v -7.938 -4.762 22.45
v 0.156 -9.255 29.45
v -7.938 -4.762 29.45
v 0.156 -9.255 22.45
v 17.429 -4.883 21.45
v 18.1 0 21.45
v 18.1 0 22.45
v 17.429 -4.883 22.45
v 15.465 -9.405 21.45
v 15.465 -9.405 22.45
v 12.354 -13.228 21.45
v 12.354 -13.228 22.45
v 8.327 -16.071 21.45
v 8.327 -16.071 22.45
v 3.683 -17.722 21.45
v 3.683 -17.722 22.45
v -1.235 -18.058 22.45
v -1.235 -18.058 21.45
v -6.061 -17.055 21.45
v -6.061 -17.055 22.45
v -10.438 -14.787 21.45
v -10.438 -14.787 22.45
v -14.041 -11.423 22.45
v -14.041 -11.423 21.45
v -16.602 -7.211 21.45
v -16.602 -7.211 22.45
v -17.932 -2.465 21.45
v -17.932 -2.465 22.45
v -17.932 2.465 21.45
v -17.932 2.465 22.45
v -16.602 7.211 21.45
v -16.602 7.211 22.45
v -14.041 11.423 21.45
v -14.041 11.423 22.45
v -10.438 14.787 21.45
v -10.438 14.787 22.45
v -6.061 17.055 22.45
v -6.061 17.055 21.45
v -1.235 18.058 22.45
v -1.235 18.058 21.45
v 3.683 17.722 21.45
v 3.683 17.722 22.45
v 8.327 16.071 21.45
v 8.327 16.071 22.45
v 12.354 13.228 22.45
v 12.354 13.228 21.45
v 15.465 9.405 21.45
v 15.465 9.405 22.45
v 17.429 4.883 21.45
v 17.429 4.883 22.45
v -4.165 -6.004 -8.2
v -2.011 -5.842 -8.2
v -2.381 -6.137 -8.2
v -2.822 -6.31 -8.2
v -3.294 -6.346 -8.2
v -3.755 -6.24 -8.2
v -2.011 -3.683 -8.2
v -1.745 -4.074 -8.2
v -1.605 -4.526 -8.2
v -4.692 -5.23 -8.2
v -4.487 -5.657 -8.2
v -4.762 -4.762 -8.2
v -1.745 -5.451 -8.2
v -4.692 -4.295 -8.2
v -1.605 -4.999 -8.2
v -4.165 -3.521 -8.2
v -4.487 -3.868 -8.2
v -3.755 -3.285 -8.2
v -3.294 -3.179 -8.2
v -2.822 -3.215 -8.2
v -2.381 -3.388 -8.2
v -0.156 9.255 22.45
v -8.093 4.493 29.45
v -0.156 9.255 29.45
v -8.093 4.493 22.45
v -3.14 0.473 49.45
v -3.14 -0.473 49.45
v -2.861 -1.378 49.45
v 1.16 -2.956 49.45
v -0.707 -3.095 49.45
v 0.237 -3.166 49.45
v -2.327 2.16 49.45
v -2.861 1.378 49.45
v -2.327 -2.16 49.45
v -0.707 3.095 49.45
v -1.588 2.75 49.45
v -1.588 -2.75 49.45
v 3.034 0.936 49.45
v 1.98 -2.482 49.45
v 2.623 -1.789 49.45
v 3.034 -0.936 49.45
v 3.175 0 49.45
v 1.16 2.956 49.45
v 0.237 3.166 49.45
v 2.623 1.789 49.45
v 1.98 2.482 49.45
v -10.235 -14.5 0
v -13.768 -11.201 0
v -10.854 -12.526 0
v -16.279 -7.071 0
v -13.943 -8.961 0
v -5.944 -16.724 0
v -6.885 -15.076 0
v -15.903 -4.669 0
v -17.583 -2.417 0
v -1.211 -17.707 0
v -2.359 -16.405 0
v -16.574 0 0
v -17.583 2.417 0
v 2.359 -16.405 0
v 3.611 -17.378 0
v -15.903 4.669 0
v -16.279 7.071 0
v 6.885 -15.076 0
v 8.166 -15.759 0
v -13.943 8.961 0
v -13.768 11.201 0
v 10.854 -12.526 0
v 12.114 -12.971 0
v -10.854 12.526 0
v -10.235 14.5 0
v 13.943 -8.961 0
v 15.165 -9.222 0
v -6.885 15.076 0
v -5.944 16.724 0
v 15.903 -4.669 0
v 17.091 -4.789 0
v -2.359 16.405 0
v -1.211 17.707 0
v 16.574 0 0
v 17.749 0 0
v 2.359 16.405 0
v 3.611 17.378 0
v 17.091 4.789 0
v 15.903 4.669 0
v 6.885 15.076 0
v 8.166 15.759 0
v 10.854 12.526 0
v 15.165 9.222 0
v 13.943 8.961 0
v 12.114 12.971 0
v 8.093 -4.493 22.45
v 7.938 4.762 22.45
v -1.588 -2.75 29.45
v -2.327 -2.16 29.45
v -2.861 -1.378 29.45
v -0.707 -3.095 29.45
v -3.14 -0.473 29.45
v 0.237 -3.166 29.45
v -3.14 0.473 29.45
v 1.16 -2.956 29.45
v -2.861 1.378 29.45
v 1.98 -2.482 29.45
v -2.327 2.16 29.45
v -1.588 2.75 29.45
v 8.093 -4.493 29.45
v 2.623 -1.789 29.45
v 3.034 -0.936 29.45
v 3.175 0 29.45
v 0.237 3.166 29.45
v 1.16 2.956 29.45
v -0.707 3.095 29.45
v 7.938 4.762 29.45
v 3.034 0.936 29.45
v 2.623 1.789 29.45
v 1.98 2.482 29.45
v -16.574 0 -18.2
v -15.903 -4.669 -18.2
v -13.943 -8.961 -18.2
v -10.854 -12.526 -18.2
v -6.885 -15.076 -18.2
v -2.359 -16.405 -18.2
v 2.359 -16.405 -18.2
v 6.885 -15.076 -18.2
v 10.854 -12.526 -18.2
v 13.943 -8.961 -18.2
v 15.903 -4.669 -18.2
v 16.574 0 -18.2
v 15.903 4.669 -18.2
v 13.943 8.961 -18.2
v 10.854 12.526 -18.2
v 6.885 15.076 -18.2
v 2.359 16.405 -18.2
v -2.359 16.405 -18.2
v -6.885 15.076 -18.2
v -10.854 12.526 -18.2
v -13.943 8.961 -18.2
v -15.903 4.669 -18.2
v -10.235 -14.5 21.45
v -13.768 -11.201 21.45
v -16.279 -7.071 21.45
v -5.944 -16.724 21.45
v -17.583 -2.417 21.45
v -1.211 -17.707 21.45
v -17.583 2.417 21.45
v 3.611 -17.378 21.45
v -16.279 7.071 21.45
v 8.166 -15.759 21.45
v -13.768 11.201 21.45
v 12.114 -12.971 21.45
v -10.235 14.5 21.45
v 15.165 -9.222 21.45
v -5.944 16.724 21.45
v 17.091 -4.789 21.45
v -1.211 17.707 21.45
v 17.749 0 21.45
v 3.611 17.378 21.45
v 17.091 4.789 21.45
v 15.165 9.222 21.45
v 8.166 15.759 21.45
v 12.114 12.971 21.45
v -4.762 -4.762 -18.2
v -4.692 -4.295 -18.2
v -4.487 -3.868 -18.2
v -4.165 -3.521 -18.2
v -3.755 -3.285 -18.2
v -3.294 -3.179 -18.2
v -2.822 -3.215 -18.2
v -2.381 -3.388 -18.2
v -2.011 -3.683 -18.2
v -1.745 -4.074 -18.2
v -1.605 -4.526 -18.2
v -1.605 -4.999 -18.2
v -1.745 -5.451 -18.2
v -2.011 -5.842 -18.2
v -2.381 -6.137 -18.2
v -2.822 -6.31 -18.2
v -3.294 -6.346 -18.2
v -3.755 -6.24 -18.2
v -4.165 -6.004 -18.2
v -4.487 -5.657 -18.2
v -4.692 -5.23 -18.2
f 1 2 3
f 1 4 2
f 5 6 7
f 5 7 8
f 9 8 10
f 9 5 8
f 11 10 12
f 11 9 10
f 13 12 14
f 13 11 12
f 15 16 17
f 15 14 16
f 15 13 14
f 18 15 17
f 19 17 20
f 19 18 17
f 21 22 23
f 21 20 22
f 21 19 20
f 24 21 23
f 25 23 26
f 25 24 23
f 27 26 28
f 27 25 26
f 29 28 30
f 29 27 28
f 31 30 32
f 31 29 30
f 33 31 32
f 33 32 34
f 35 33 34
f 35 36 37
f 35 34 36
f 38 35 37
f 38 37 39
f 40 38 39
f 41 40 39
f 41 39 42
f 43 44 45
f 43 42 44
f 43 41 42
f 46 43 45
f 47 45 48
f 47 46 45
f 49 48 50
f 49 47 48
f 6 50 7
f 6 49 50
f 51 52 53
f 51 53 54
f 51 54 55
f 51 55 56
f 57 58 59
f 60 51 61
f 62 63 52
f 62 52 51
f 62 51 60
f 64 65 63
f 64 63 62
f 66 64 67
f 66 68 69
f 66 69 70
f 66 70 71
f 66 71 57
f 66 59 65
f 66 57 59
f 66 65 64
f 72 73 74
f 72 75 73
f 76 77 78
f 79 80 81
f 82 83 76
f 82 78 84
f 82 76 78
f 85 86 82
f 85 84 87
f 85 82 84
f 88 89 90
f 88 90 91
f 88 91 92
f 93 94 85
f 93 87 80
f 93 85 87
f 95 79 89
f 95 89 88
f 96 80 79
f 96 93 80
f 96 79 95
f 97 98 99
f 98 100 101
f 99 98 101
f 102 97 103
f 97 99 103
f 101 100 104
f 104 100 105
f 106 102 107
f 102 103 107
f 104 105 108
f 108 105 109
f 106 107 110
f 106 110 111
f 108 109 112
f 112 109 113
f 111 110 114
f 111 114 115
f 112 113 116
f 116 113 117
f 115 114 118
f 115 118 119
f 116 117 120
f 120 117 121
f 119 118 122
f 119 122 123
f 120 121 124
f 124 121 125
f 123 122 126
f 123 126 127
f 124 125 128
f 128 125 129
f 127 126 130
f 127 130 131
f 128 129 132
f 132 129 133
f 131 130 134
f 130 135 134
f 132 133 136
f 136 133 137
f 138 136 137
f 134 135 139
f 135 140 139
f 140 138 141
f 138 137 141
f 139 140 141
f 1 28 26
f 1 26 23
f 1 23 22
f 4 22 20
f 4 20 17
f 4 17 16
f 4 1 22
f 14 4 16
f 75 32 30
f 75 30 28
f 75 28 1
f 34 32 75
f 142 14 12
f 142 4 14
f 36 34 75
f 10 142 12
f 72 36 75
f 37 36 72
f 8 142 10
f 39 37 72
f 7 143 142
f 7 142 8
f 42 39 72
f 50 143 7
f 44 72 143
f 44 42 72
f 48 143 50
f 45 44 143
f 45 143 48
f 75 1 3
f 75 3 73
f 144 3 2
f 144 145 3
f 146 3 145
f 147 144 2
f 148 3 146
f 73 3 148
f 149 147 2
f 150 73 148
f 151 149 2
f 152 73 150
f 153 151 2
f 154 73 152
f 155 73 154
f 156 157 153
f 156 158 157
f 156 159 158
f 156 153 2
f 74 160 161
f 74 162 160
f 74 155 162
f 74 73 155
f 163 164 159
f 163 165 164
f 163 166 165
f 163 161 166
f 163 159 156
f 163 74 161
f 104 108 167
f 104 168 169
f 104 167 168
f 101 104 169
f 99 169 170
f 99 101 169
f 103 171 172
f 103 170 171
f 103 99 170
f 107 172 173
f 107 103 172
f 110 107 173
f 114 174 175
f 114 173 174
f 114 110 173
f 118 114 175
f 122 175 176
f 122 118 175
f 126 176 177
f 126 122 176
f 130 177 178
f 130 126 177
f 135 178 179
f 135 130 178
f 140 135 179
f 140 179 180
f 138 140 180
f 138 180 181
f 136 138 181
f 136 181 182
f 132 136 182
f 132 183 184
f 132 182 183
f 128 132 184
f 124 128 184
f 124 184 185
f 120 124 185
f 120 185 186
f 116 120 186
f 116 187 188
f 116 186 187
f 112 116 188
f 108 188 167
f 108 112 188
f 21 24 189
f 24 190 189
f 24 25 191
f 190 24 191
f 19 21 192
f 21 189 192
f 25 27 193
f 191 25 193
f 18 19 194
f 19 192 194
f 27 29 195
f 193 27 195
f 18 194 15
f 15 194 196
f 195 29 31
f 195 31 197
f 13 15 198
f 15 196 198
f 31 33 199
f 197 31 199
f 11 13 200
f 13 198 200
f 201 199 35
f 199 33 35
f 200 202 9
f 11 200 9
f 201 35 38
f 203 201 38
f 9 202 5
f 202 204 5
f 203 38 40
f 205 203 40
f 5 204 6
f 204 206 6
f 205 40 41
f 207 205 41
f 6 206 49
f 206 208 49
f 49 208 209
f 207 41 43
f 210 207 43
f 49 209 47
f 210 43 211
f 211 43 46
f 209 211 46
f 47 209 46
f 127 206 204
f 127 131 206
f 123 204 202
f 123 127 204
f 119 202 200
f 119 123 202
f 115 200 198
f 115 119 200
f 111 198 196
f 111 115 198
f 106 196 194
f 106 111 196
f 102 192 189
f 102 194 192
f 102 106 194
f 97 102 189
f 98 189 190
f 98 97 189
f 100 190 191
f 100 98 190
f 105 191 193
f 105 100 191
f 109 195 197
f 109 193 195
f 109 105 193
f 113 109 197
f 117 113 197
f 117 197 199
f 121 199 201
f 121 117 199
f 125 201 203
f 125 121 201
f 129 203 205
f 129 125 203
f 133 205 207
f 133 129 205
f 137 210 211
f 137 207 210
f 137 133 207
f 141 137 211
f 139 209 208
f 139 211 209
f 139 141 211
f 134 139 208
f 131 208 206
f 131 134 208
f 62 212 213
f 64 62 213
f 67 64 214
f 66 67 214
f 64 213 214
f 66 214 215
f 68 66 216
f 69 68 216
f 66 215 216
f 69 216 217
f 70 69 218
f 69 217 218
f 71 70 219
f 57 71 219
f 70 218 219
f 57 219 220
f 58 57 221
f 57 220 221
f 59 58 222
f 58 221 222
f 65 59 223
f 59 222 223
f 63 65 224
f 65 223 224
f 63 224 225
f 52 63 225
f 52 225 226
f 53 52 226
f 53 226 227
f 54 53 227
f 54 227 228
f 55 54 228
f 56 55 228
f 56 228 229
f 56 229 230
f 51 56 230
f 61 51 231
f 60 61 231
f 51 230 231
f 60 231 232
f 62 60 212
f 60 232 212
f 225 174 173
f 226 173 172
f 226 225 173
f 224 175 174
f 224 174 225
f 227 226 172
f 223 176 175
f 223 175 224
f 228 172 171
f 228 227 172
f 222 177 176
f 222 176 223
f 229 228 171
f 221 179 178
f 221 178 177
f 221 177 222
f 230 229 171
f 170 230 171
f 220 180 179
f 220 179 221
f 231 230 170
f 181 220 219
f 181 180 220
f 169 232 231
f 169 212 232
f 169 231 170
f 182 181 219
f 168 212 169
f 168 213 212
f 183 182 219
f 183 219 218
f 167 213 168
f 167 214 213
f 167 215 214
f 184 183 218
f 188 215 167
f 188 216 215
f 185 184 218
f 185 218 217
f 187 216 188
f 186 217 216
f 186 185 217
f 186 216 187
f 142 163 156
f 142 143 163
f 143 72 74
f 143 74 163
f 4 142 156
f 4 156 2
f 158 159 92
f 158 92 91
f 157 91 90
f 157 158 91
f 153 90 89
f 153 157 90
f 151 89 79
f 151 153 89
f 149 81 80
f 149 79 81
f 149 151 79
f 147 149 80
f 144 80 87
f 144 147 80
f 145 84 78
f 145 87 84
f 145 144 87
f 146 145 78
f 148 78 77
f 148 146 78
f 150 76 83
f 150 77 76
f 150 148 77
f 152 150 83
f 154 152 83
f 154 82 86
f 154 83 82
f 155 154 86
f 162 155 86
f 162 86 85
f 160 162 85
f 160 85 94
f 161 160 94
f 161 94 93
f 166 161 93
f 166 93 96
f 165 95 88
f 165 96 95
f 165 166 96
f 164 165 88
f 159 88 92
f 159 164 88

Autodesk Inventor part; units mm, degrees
ref_plane "YZ Plane" through (0, 0, 0) normal (1, 0, 0) x (0, 1, 0)
ref_plane "XZ Plane" through (0, 0, 0) normal (0, 1, 0) x (-1, 0, 0)
ref_plane "XY Plane" through (0, 0, 0) normal (0, 0, 1) x (1, 0, 0)
sketch "Sketch1" plane through (0, 0, 0) normal (0, 0, 1) x (1, 0, 0)
  circle A0 centre (0, 0) radius 17.7488
extrude "Extrusion1" add sketch "Sketch1" along normal blind 21.45
sketch "Sketch2" plane through (0, 0, 0) normal (0, 0, -1) x (-1, 0, 0)
  circle A0 centre (0, 0) radius 16.574
extrude "Extrusion2" add sketch "Sketch2" along normal blind 18.2
sketch "Sketch5" plane through (0, 0, 21.45) normal (0, 0, 1) x (1, 0, 0)
  circle A0 centre (0, 0) radius 18.1003
extrude "Extrusion5" add sketch "Sketch5" along normal blind 1
sketch "Sketch3" plane through (0, 0, -18.2) normal (0, 0, -1) x (-1, 0, 0)
  circle A0 centre (0, 0) radius 17.7488 projected
  line L0 (17.7488, 0) -> (14.2875, 0)
  circle A1 centre (0, 0) radius 16.574 projected
  line L1 (15.3093, 6.35) -> (15.3093, -6.35)
  circle A2 centre (3.175, 7.9375) radius 1.5875
extrude "Extrusion3" add sketch "Sketch3" against normal blind 10 contours A2
sketch "Sketch4" plane through (0, 0, -18.2) normal (0, 0, -1) x (-1, 0, 0)
  circle A0 centre (3.175, -4.7625) radius 1.5875
  point P0 (0, 0)
extrude "Extrusion4" cut sketch "Sketch4" against normal blind 10
sketch "Sketch6" plane through (0, 0, 22.45) normal (0, 0, 1) x (1, 0, 0)
  point P0 (0, 0)
sketch "Sketch7" plane through (0, 0, 22.45) normal (0, 0, 1) x (1, 0, 0)
  line L0 (7.9375, 4.7625) -> (8.0932, -4.4928)
  line L1 (8.0932, -4.4928) -> (0.1557, -9.2553)
  line L2 (0.1557, -9.2553) -> (-7.9375, -4.7625)
  line L3 (-7.9375, -4.7625) -> (-8.0932, 4.4928)
  line L4 (-8.0932, 4.4928) -> (-0.1557, 9.2553)
  line L5 (-0.1557, 9.2553) -> (7.9375, 4.7625)
  point P0 (0, 0)
  point P1 (0, 0)
sketch "Sketch8" plane through (0, 0, 22.45) normal (0, 0, 1) x (1, 0, 0)
  point P0 (0, 0)
extrude "Extrusion6" add sketch "Sketch7" along normal blind 7
sketch "Sketch9" plane through (0, 0, 29.45) normal (0, 0, 1) x (1, 0, 0)
  circle A0 centre (0, 0) radius 3.175
extrude "Extrusion7" add sketch "Sketch9" along normal blind 20
properties part number "DC MOTOR1" material "Iron, Gray"
